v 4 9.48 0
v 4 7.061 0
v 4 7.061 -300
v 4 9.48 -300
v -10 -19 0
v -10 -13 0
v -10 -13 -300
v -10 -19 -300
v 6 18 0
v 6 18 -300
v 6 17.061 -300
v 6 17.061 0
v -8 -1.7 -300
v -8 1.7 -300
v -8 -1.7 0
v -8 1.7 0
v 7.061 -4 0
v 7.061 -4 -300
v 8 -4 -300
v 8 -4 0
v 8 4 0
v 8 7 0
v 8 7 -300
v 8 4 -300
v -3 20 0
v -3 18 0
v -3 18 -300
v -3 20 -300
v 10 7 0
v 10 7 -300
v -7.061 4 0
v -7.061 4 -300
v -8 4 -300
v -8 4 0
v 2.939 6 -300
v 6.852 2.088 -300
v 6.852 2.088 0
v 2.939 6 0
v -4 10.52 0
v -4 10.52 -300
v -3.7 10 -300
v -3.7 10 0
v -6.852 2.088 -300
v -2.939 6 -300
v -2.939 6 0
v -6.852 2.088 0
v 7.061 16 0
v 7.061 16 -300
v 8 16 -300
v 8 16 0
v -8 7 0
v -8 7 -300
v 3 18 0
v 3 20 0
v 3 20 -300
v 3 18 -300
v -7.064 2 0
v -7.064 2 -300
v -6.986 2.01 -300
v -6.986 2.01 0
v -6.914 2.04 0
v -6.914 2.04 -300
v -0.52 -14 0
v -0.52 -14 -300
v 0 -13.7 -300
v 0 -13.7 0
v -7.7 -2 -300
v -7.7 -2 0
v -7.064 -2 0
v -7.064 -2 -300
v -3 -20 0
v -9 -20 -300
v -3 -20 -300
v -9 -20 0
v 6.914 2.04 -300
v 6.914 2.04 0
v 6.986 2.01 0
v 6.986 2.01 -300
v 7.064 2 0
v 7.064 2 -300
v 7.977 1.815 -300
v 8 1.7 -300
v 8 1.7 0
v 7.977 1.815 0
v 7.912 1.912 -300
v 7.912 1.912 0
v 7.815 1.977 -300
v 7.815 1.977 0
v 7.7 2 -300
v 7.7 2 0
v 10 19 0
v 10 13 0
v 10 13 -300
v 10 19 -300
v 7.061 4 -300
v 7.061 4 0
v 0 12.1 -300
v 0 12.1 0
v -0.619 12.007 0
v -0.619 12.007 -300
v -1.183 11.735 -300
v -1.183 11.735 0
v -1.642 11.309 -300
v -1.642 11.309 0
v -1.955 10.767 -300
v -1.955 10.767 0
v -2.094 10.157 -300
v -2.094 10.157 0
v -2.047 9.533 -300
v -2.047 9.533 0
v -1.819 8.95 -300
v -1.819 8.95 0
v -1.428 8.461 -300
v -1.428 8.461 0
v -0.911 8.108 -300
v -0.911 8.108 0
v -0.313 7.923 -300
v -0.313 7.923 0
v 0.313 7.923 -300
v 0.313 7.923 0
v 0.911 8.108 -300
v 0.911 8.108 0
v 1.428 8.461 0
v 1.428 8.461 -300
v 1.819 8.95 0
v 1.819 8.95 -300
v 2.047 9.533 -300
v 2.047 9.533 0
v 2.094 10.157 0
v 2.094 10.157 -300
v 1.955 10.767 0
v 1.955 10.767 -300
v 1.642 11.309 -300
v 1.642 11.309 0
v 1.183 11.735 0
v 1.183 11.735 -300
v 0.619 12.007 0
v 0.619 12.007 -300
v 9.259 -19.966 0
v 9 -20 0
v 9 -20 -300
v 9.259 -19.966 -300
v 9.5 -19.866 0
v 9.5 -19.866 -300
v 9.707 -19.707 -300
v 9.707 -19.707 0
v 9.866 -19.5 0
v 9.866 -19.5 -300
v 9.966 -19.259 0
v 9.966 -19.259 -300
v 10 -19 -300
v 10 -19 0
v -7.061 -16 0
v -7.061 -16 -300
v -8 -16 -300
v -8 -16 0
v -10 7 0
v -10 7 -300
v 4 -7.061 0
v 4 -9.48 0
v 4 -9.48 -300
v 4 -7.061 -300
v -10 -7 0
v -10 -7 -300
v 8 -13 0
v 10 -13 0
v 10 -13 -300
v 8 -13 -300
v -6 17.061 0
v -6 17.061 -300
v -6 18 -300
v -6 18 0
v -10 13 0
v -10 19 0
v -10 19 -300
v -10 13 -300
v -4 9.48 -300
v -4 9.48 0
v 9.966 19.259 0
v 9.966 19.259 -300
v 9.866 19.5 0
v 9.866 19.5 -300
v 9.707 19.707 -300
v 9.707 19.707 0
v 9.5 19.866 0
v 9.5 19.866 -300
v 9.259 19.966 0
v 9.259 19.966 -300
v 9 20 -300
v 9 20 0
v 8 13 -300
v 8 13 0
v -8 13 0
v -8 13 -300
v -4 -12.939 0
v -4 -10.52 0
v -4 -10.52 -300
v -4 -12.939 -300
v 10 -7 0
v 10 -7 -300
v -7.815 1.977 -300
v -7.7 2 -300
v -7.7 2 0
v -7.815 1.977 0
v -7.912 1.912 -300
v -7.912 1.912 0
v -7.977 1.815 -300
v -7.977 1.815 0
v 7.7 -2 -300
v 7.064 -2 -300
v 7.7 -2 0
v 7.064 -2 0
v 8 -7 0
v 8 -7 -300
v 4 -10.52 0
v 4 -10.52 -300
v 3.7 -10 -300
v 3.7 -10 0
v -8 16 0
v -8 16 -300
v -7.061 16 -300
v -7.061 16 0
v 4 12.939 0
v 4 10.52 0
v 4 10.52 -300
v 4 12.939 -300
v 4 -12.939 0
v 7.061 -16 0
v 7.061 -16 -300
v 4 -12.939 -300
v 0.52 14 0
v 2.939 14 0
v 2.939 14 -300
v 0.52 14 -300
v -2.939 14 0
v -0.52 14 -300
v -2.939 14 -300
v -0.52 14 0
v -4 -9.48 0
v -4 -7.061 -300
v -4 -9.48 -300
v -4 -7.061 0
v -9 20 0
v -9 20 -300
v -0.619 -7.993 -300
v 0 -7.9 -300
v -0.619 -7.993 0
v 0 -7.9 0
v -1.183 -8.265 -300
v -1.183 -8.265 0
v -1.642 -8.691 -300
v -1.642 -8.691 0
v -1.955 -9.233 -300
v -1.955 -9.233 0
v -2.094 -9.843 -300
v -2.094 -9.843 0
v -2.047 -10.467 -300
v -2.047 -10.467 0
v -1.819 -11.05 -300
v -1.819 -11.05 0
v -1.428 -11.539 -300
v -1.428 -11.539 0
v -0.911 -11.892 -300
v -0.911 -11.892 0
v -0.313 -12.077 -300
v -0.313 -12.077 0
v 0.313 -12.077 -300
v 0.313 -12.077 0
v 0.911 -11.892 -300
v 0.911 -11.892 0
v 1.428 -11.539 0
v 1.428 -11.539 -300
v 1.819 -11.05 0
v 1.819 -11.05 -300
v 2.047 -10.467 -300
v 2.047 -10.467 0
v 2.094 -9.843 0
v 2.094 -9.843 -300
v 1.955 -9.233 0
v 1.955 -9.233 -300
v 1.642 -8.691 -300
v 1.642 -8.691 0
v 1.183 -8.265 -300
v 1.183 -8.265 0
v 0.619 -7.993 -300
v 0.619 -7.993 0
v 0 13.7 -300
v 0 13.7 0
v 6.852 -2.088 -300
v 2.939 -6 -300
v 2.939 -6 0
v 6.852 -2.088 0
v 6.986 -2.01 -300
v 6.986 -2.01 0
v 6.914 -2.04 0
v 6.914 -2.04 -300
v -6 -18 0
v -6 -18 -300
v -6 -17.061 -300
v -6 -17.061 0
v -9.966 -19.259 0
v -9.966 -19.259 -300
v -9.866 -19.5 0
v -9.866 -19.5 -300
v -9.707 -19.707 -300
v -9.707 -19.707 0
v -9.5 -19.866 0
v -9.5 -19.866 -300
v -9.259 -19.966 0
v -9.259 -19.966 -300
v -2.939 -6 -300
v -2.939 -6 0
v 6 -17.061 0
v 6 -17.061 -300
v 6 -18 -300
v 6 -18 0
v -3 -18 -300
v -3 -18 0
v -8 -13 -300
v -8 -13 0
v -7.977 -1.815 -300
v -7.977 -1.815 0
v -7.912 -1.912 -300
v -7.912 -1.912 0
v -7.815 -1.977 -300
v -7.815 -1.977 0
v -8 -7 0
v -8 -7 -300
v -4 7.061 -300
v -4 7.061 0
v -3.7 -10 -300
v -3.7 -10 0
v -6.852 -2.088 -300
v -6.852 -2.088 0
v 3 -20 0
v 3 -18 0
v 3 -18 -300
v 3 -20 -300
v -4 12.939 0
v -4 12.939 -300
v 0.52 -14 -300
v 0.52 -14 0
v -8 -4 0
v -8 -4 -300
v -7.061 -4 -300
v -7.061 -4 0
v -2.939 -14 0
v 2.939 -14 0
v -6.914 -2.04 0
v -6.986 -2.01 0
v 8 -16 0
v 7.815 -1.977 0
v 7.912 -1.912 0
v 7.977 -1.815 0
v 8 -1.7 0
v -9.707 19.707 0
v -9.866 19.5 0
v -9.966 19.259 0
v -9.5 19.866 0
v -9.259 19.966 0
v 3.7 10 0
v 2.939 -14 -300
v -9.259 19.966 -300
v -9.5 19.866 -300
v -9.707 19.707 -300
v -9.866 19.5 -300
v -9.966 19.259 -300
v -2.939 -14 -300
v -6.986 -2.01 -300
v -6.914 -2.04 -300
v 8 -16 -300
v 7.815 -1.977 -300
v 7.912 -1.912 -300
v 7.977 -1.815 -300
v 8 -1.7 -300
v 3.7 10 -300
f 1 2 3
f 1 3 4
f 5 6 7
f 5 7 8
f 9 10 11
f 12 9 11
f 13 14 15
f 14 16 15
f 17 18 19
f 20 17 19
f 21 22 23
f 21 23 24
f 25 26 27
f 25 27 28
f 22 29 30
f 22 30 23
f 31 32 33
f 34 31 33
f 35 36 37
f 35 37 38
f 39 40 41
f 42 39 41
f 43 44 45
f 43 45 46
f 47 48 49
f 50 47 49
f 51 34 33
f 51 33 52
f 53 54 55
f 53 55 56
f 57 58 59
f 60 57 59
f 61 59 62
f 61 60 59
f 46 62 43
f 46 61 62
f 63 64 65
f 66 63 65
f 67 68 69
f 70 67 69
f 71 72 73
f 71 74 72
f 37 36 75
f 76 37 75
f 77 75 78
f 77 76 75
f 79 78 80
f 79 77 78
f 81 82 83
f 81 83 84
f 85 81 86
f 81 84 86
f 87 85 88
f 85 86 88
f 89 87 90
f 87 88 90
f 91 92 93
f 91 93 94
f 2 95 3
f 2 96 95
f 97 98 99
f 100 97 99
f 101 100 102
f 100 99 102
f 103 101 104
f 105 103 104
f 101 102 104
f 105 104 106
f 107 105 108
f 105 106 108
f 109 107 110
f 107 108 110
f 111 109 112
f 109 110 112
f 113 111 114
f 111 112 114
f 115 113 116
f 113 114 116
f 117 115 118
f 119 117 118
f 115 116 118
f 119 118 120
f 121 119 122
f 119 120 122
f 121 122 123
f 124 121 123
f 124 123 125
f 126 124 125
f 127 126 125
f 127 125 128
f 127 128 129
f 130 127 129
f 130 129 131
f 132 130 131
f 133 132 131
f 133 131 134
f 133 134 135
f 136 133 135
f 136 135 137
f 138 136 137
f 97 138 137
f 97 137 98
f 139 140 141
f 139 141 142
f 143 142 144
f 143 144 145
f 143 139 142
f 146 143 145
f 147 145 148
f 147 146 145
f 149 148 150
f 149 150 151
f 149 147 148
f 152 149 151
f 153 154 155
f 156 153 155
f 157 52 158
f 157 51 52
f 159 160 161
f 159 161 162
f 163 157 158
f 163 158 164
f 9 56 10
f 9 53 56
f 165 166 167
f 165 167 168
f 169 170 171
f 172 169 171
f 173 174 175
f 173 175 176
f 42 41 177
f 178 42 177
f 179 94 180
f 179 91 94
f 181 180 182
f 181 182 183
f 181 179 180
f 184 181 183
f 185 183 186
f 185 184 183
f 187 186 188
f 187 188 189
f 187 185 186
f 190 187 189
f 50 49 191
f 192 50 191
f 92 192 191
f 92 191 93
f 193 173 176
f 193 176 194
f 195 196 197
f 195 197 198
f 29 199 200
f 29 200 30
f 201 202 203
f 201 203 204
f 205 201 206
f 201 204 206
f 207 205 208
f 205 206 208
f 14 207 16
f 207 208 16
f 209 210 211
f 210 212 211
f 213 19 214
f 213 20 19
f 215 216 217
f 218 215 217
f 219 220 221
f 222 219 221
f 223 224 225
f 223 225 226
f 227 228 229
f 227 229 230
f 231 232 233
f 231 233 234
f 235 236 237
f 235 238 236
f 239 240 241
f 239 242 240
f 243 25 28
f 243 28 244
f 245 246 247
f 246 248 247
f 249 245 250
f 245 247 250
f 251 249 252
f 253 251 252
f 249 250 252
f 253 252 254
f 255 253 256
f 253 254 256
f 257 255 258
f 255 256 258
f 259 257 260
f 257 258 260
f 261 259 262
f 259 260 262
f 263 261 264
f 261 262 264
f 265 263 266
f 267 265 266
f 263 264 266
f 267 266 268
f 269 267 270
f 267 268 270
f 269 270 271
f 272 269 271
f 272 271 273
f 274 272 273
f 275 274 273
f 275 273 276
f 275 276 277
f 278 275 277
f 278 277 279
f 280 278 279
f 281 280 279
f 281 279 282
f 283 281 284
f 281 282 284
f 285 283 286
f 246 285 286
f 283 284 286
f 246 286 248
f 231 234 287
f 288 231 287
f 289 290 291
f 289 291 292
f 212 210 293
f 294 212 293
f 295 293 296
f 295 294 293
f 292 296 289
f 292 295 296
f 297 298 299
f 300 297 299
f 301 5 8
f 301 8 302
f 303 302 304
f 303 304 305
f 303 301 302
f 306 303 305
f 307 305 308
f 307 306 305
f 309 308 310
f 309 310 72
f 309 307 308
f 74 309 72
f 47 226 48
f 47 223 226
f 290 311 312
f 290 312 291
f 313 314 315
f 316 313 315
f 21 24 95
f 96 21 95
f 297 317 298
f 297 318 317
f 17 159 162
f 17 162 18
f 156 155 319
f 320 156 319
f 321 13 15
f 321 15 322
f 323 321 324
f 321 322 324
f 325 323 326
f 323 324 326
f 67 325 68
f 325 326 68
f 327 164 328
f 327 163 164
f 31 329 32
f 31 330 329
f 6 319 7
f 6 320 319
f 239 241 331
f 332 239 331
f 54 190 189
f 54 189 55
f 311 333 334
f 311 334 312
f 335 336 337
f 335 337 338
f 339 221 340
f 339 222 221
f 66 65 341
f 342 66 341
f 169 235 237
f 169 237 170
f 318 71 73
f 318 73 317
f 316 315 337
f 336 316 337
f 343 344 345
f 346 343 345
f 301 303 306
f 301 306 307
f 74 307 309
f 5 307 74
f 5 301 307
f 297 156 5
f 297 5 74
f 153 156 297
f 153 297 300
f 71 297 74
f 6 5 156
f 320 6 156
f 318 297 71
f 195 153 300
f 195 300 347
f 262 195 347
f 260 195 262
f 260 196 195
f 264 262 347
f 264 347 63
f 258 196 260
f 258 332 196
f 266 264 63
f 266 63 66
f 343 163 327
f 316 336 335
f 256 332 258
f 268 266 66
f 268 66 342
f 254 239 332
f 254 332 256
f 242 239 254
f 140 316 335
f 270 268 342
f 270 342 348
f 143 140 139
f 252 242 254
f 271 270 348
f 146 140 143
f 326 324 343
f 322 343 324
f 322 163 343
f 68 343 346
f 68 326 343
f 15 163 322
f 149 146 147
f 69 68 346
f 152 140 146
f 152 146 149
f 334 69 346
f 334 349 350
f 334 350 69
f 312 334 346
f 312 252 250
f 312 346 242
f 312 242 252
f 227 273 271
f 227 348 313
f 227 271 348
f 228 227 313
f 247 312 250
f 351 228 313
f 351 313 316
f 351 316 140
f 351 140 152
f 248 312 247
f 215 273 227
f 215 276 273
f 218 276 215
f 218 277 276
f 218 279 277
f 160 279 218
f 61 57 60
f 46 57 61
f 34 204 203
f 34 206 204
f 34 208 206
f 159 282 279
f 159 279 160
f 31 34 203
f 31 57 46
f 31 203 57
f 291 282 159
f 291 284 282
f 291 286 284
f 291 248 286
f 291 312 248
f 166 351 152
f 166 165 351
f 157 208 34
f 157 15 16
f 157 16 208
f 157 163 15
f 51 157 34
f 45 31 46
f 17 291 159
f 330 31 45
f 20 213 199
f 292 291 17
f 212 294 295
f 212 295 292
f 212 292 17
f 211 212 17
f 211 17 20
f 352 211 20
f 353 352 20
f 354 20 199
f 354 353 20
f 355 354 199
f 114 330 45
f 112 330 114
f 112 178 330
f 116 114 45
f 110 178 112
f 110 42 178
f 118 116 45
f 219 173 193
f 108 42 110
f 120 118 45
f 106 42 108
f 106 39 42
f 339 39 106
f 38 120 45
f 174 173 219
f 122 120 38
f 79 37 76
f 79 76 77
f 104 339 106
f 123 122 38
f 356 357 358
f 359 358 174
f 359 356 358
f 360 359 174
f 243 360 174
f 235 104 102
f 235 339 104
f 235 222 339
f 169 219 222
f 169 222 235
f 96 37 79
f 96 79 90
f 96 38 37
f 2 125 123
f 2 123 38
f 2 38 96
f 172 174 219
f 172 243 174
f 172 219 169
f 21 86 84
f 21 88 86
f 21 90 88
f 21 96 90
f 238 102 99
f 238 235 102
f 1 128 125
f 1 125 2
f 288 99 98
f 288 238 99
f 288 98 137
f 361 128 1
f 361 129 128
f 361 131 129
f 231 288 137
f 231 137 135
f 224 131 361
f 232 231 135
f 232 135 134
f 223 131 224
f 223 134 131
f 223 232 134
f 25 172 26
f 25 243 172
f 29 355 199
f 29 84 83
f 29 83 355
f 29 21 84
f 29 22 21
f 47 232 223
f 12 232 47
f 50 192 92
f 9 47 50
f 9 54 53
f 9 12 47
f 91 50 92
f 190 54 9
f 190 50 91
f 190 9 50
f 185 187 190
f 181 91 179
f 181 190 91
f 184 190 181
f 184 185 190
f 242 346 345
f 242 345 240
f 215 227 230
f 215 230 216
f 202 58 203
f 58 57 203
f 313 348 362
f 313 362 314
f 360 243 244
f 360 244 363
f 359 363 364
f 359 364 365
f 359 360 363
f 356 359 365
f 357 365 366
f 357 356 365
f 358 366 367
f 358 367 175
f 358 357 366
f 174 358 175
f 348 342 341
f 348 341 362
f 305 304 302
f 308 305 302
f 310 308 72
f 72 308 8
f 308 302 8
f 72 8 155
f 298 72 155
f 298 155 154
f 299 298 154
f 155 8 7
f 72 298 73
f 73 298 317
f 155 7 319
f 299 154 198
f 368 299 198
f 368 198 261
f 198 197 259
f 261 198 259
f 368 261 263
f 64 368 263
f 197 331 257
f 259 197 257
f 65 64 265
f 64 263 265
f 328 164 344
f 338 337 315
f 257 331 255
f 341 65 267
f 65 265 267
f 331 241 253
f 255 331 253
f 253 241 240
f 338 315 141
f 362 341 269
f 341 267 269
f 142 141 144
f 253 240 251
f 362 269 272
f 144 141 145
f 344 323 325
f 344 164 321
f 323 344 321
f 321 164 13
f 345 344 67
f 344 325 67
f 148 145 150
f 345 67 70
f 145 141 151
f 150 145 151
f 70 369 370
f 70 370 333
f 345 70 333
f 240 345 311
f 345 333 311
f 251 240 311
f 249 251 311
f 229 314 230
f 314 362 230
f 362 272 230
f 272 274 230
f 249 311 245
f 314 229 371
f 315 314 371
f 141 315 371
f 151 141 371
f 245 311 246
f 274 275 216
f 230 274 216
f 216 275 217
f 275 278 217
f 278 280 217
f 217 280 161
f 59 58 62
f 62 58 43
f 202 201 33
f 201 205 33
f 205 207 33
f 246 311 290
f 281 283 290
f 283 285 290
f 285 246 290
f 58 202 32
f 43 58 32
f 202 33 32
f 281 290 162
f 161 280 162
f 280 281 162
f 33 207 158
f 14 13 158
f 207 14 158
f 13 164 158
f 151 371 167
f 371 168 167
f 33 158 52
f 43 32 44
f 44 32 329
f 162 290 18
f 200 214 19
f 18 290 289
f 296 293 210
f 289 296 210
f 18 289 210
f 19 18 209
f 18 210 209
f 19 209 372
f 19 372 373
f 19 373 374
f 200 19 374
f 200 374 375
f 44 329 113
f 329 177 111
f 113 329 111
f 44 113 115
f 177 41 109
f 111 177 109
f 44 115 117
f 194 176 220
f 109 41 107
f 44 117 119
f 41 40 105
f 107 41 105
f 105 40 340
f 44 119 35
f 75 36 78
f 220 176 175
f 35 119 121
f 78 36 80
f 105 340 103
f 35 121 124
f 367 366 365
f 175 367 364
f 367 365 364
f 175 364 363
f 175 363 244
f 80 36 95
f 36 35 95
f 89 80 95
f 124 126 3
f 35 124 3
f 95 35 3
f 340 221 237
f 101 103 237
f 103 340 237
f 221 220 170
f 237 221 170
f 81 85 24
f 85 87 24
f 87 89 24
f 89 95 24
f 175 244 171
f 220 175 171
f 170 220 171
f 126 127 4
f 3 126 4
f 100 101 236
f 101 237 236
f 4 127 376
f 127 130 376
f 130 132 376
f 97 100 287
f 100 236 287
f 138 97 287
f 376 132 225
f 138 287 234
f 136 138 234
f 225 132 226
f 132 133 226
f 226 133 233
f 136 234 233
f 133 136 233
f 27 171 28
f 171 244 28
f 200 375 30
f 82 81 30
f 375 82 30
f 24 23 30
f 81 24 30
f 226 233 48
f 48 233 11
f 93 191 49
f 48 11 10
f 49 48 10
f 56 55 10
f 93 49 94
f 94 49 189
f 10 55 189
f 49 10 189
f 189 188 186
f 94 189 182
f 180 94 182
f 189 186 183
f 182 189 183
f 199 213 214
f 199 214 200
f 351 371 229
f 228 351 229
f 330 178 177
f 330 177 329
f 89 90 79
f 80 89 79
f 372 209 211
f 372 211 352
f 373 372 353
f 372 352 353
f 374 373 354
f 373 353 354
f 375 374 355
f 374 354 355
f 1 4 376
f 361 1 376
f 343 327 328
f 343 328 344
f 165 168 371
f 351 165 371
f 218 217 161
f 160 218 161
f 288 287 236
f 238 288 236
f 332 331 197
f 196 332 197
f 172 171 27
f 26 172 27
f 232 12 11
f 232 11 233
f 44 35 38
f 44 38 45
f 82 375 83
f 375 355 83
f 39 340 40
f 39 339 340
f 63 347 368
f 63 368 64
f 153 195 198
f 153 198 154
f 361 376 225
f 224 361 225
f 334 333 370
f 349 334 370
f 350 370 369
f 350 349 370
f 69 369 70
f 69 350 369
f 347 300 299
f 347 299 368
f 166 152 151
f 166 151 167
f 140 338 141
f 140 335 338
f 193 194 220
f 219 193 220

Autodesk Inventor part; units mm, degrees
sketch "Sketch_1" plane through (0, 0, 0) normal (0, 0, 1) x (1, 0, 0)
  line L0 (-10, -7) -> (-8, -7)
  line L1 (-8, -7) -> (-8, -4)
  line L2 (-8, -4) -> (-7.0607, -4)
  line L3 (-7.0607, -4) -> (-4, -7.0607)
  line L4 (-4, -7.0607) -> (-4, -9.4804)
  line L5 (-4, -9.4804) -> (-3.7, -10)
  line L6 (-3.7, -10) -> (-4, -10.5196)
  line L7 (-4, -10.5196) -> (-4, -12.9393)
  line L8 (-4, -12.9393) -> (-7.0607, -16)
  line L9 (-7.0607, -16) -> (-8, -16)
  line L10 (-8, -16) -> (-8, -13)
  line L11 (-8, -13) -> (-10, -13)
  line L12 (-10, -13) -> (-10, -19)
  arc A0 (-10, -19) -> (-9, -20) centre (-9, -19) ccw
  line L13 (-9, -20) -> (-3, -20)
  line L14 (-3, -20) -> (-3, -18)
  line L15 (-3, -18) -> (-6, -18)
  line L16 (-6, -18) -> (-6, -17.0607)
  line L17 (-6, -17.0607) -> (-2.9393, -14)
  line L18 (-2.9393, -14) -> (-0.5196, -14)
  line L19 (-0.5196, -14) -> (0, -13.7)
  line L20 (0, -13.7) -> (0.5196, -14)
  line L21 (0.5196, -14) -> (2.9393, -14)
  line L22 (2.9393, -14) -> (6, -17.0607)
  line L23 (6, -17.0607) -> (6, -18)
  line L24 (6, -18) -> (3, -18)
  line L25 (3, -18) -> (3, -20)
  line L26 (3, -20) -> (9, -20)
  arc A1 (9, -20) -> (10, -19) centre (9, -19) ccw
  line L27 (10, -19) -> (10, -13)
  line L28 (10, -13) -> (8, -13)
  line L29 (8, -13) -> (8, -16)
  line L30 (8, -16) -> (7.0607, -16)
  line L31 (7.0607, -16) -> (4, -12.9393)
  line L32 (4, -12.9393) -> (4, -10.5196)
  line L33 (4, -10.5196) -> (3.7, -10)
  line L34 (3.7, -10) -> (4, -9.4804)
  line L35 (4, -9.4804) -> (4, -7.0607)
  line L36 (4, -7.0607) -> (7.0607, -4)
  line L37 (7.0607, -4) -> (8, -4)
  line L38 (8, -4) -> (8, -7)
  line L39 (8, -7) -> (10, -7)
  line L40 (10, -7) -> (10, 7)
  line L41 (10, 7) -> (8, 7)
  line L42 (8, 7) -> (8, 4)
  line L43 (8, 4) -> (7.0607, 4)
  line L44 (7.0607, 4) -> (4, 7.0607)
  line L45 (4, 7.0607) -> (4, 9.4804)
  line L46 (4, 9.4804) -> (3.7, 10)
  line L47 (3.7, 10) -> (4, 10.5196)
  line L48 (4, 10.5196) -> (4, 12.9393)
  line L49 (4, 12.9393) -> (7.0607, 16)
  line L50 (7.0607, 16) -> (8, 16)
  line L51 (8, 16) -> (8, 13)
  line L52 (8, 13) -> (10, 13)
  line L53 (10, 13) -> (10, 19)
  arc A2 (10, 19) -> (9, 20) centre (9, 19) ccw
  line L54 (9, 20) -> (3, 20)
  line L55 (3, 20) -> (3, 18)
  line L56 (3, 18) -> (6, 18)
  line L57 (6, 18) -> (6, 17.0607)
  line L58 (6, 17.0607) -> (2.9393, 14)
  line L59 (2.9393, 14) -> (0.5196, 14)
  line L60 (0.5196, 14) -> (0, 13.7)
  line L61 (0, 13.7) -> (-0.5196, 14)
  line L62 (-0.5196, 14) -> (-2.9393, 14)
  line L63 (-2.9393, 14) -> (-6, 17.0607)
  line L64 (-6, 17.0607) -> (-6, 18)
  line L65 (-6, 18) -> (-3, 18)
  line L66 (-3, 18) -> (-3, 20)
  line L67 (-3, 20) -> (-9, 20)
  arc A3 (-9, 20) -> (-10, 19) centre (-9, 19) ccw
  line L68 (-10, 19) -> (-10, 13)
  line L69 (-10, 13) -> (-8, 13)
  line L70 (-8, 13) -> (-8, 16)
  line L71 (-8, 16) -> (-7.0607, 16)
  line L72 (-7.0607, 16) -> (-4, 12.9393)
  line L73 (-4, 12.9393) -> (-4, 10.5196)
  line L74 (-4, 10.5196) -> (-3.7, 10)
  line L75 (-3.7, 10) -> (-4, 9.4804)
  line L76 (-4, 9.4804) -> (-4, 7.0607)
  line L77 (-4, 7.0607) -> (-7.0607, 4)
  line L78 (-7.0607, 4) -> (-8, 4)
  line L79 (-8, 4) -> (-8, 7)
  line L80 (-8, 7) -> (-10, 7)
  line L81 (-10, 7) -> (-10, -7)
  line L82 (-8, 1.7) -> (-8, -1.7)
  arc A4 (-8, -1.7) -> (-7.7, -2) centre (-7.7, -1.7) ccw
  line L83 (-7.7, -2) -> (-7.0636, -2)
  arc A5 (-6.8515, -2.0879) -> (-7.0636, -2) centre (-7.0636, -2.3) ccw
  line L84 (-6.8515, -2.0879) -> (-2.9393, -6)
  line L85 (-2.9393, -6) -> (2.9393, -6)
  line L86 (2.9393, -6) -> (6.8515, -2.0879)
  arc A6 (7.0636, -2) -> (6.8515, -2.0879) centre (7.0636, -2.3) ccw
  line L87 (7.0636, -2) -> (7.7, -2)
  arc A7 (7.7, -2) -> (8, -1.7) centre (7.7, -1.7) ccw
  line L88 (8, -1.7) -> (8, 1.7)
  arc A8 (8, 1.7) -> (7.7, 2) centre (7.7, 1.7) ccw
  line L89 (7.7, 2) -> (7.0636, 2)
  arc A9 (6.8515, 2.0879) -> (7.0636, 2) centre (7.0636, 2.3) ccw
  line L90 (6.8515, 2.0879) -> (2.9393, 6)
  line L91 (2.9393, 6) -> (-2.9393, 6)
  line L92 (-2.9393, 6) -> (-6.8515, 2.0879)
  arc A10 (-7.0636, 2) -> (-6.8515, 2.0879) centre (-7.0636, 2.3) ccw
  line L93 (-7.0636, 2) -> (-7.7, 2)
  arc A11 (-7.7, 2) -> (-8, 1.7) centre (-7.7, 1.7) ccw
extrude "Extrusion1" add sketch "Sketch_1" against normal blind 300
sketch "Sketch2" plane through (0, 0, -300) normal (0, 0, -1) x (-1, 0, 0)
  point P0 (0, 10)
hole "Hole1" at (0, 10, -300) direction (0, 0, 1) diameter 4.2 depth 300
pattern_linear "Rectangular Pattern1" count 2 spacing 20 along (0, -1, 0) of "Hole1"
ref_plane "C1_XY" through (0, 0, 0) normal (0, 0, 1) x (1, 0, 0)
ref_plane "C1_YZ" through (0, 0, 0) normal (1, 0, 0) x (0, 1, 0)
ref_plane "C1_ZX" through (0, 0, 0) normal (0, 1, 0) x (0, 0, 1)
properties part number "HFSB5-2040-300"
